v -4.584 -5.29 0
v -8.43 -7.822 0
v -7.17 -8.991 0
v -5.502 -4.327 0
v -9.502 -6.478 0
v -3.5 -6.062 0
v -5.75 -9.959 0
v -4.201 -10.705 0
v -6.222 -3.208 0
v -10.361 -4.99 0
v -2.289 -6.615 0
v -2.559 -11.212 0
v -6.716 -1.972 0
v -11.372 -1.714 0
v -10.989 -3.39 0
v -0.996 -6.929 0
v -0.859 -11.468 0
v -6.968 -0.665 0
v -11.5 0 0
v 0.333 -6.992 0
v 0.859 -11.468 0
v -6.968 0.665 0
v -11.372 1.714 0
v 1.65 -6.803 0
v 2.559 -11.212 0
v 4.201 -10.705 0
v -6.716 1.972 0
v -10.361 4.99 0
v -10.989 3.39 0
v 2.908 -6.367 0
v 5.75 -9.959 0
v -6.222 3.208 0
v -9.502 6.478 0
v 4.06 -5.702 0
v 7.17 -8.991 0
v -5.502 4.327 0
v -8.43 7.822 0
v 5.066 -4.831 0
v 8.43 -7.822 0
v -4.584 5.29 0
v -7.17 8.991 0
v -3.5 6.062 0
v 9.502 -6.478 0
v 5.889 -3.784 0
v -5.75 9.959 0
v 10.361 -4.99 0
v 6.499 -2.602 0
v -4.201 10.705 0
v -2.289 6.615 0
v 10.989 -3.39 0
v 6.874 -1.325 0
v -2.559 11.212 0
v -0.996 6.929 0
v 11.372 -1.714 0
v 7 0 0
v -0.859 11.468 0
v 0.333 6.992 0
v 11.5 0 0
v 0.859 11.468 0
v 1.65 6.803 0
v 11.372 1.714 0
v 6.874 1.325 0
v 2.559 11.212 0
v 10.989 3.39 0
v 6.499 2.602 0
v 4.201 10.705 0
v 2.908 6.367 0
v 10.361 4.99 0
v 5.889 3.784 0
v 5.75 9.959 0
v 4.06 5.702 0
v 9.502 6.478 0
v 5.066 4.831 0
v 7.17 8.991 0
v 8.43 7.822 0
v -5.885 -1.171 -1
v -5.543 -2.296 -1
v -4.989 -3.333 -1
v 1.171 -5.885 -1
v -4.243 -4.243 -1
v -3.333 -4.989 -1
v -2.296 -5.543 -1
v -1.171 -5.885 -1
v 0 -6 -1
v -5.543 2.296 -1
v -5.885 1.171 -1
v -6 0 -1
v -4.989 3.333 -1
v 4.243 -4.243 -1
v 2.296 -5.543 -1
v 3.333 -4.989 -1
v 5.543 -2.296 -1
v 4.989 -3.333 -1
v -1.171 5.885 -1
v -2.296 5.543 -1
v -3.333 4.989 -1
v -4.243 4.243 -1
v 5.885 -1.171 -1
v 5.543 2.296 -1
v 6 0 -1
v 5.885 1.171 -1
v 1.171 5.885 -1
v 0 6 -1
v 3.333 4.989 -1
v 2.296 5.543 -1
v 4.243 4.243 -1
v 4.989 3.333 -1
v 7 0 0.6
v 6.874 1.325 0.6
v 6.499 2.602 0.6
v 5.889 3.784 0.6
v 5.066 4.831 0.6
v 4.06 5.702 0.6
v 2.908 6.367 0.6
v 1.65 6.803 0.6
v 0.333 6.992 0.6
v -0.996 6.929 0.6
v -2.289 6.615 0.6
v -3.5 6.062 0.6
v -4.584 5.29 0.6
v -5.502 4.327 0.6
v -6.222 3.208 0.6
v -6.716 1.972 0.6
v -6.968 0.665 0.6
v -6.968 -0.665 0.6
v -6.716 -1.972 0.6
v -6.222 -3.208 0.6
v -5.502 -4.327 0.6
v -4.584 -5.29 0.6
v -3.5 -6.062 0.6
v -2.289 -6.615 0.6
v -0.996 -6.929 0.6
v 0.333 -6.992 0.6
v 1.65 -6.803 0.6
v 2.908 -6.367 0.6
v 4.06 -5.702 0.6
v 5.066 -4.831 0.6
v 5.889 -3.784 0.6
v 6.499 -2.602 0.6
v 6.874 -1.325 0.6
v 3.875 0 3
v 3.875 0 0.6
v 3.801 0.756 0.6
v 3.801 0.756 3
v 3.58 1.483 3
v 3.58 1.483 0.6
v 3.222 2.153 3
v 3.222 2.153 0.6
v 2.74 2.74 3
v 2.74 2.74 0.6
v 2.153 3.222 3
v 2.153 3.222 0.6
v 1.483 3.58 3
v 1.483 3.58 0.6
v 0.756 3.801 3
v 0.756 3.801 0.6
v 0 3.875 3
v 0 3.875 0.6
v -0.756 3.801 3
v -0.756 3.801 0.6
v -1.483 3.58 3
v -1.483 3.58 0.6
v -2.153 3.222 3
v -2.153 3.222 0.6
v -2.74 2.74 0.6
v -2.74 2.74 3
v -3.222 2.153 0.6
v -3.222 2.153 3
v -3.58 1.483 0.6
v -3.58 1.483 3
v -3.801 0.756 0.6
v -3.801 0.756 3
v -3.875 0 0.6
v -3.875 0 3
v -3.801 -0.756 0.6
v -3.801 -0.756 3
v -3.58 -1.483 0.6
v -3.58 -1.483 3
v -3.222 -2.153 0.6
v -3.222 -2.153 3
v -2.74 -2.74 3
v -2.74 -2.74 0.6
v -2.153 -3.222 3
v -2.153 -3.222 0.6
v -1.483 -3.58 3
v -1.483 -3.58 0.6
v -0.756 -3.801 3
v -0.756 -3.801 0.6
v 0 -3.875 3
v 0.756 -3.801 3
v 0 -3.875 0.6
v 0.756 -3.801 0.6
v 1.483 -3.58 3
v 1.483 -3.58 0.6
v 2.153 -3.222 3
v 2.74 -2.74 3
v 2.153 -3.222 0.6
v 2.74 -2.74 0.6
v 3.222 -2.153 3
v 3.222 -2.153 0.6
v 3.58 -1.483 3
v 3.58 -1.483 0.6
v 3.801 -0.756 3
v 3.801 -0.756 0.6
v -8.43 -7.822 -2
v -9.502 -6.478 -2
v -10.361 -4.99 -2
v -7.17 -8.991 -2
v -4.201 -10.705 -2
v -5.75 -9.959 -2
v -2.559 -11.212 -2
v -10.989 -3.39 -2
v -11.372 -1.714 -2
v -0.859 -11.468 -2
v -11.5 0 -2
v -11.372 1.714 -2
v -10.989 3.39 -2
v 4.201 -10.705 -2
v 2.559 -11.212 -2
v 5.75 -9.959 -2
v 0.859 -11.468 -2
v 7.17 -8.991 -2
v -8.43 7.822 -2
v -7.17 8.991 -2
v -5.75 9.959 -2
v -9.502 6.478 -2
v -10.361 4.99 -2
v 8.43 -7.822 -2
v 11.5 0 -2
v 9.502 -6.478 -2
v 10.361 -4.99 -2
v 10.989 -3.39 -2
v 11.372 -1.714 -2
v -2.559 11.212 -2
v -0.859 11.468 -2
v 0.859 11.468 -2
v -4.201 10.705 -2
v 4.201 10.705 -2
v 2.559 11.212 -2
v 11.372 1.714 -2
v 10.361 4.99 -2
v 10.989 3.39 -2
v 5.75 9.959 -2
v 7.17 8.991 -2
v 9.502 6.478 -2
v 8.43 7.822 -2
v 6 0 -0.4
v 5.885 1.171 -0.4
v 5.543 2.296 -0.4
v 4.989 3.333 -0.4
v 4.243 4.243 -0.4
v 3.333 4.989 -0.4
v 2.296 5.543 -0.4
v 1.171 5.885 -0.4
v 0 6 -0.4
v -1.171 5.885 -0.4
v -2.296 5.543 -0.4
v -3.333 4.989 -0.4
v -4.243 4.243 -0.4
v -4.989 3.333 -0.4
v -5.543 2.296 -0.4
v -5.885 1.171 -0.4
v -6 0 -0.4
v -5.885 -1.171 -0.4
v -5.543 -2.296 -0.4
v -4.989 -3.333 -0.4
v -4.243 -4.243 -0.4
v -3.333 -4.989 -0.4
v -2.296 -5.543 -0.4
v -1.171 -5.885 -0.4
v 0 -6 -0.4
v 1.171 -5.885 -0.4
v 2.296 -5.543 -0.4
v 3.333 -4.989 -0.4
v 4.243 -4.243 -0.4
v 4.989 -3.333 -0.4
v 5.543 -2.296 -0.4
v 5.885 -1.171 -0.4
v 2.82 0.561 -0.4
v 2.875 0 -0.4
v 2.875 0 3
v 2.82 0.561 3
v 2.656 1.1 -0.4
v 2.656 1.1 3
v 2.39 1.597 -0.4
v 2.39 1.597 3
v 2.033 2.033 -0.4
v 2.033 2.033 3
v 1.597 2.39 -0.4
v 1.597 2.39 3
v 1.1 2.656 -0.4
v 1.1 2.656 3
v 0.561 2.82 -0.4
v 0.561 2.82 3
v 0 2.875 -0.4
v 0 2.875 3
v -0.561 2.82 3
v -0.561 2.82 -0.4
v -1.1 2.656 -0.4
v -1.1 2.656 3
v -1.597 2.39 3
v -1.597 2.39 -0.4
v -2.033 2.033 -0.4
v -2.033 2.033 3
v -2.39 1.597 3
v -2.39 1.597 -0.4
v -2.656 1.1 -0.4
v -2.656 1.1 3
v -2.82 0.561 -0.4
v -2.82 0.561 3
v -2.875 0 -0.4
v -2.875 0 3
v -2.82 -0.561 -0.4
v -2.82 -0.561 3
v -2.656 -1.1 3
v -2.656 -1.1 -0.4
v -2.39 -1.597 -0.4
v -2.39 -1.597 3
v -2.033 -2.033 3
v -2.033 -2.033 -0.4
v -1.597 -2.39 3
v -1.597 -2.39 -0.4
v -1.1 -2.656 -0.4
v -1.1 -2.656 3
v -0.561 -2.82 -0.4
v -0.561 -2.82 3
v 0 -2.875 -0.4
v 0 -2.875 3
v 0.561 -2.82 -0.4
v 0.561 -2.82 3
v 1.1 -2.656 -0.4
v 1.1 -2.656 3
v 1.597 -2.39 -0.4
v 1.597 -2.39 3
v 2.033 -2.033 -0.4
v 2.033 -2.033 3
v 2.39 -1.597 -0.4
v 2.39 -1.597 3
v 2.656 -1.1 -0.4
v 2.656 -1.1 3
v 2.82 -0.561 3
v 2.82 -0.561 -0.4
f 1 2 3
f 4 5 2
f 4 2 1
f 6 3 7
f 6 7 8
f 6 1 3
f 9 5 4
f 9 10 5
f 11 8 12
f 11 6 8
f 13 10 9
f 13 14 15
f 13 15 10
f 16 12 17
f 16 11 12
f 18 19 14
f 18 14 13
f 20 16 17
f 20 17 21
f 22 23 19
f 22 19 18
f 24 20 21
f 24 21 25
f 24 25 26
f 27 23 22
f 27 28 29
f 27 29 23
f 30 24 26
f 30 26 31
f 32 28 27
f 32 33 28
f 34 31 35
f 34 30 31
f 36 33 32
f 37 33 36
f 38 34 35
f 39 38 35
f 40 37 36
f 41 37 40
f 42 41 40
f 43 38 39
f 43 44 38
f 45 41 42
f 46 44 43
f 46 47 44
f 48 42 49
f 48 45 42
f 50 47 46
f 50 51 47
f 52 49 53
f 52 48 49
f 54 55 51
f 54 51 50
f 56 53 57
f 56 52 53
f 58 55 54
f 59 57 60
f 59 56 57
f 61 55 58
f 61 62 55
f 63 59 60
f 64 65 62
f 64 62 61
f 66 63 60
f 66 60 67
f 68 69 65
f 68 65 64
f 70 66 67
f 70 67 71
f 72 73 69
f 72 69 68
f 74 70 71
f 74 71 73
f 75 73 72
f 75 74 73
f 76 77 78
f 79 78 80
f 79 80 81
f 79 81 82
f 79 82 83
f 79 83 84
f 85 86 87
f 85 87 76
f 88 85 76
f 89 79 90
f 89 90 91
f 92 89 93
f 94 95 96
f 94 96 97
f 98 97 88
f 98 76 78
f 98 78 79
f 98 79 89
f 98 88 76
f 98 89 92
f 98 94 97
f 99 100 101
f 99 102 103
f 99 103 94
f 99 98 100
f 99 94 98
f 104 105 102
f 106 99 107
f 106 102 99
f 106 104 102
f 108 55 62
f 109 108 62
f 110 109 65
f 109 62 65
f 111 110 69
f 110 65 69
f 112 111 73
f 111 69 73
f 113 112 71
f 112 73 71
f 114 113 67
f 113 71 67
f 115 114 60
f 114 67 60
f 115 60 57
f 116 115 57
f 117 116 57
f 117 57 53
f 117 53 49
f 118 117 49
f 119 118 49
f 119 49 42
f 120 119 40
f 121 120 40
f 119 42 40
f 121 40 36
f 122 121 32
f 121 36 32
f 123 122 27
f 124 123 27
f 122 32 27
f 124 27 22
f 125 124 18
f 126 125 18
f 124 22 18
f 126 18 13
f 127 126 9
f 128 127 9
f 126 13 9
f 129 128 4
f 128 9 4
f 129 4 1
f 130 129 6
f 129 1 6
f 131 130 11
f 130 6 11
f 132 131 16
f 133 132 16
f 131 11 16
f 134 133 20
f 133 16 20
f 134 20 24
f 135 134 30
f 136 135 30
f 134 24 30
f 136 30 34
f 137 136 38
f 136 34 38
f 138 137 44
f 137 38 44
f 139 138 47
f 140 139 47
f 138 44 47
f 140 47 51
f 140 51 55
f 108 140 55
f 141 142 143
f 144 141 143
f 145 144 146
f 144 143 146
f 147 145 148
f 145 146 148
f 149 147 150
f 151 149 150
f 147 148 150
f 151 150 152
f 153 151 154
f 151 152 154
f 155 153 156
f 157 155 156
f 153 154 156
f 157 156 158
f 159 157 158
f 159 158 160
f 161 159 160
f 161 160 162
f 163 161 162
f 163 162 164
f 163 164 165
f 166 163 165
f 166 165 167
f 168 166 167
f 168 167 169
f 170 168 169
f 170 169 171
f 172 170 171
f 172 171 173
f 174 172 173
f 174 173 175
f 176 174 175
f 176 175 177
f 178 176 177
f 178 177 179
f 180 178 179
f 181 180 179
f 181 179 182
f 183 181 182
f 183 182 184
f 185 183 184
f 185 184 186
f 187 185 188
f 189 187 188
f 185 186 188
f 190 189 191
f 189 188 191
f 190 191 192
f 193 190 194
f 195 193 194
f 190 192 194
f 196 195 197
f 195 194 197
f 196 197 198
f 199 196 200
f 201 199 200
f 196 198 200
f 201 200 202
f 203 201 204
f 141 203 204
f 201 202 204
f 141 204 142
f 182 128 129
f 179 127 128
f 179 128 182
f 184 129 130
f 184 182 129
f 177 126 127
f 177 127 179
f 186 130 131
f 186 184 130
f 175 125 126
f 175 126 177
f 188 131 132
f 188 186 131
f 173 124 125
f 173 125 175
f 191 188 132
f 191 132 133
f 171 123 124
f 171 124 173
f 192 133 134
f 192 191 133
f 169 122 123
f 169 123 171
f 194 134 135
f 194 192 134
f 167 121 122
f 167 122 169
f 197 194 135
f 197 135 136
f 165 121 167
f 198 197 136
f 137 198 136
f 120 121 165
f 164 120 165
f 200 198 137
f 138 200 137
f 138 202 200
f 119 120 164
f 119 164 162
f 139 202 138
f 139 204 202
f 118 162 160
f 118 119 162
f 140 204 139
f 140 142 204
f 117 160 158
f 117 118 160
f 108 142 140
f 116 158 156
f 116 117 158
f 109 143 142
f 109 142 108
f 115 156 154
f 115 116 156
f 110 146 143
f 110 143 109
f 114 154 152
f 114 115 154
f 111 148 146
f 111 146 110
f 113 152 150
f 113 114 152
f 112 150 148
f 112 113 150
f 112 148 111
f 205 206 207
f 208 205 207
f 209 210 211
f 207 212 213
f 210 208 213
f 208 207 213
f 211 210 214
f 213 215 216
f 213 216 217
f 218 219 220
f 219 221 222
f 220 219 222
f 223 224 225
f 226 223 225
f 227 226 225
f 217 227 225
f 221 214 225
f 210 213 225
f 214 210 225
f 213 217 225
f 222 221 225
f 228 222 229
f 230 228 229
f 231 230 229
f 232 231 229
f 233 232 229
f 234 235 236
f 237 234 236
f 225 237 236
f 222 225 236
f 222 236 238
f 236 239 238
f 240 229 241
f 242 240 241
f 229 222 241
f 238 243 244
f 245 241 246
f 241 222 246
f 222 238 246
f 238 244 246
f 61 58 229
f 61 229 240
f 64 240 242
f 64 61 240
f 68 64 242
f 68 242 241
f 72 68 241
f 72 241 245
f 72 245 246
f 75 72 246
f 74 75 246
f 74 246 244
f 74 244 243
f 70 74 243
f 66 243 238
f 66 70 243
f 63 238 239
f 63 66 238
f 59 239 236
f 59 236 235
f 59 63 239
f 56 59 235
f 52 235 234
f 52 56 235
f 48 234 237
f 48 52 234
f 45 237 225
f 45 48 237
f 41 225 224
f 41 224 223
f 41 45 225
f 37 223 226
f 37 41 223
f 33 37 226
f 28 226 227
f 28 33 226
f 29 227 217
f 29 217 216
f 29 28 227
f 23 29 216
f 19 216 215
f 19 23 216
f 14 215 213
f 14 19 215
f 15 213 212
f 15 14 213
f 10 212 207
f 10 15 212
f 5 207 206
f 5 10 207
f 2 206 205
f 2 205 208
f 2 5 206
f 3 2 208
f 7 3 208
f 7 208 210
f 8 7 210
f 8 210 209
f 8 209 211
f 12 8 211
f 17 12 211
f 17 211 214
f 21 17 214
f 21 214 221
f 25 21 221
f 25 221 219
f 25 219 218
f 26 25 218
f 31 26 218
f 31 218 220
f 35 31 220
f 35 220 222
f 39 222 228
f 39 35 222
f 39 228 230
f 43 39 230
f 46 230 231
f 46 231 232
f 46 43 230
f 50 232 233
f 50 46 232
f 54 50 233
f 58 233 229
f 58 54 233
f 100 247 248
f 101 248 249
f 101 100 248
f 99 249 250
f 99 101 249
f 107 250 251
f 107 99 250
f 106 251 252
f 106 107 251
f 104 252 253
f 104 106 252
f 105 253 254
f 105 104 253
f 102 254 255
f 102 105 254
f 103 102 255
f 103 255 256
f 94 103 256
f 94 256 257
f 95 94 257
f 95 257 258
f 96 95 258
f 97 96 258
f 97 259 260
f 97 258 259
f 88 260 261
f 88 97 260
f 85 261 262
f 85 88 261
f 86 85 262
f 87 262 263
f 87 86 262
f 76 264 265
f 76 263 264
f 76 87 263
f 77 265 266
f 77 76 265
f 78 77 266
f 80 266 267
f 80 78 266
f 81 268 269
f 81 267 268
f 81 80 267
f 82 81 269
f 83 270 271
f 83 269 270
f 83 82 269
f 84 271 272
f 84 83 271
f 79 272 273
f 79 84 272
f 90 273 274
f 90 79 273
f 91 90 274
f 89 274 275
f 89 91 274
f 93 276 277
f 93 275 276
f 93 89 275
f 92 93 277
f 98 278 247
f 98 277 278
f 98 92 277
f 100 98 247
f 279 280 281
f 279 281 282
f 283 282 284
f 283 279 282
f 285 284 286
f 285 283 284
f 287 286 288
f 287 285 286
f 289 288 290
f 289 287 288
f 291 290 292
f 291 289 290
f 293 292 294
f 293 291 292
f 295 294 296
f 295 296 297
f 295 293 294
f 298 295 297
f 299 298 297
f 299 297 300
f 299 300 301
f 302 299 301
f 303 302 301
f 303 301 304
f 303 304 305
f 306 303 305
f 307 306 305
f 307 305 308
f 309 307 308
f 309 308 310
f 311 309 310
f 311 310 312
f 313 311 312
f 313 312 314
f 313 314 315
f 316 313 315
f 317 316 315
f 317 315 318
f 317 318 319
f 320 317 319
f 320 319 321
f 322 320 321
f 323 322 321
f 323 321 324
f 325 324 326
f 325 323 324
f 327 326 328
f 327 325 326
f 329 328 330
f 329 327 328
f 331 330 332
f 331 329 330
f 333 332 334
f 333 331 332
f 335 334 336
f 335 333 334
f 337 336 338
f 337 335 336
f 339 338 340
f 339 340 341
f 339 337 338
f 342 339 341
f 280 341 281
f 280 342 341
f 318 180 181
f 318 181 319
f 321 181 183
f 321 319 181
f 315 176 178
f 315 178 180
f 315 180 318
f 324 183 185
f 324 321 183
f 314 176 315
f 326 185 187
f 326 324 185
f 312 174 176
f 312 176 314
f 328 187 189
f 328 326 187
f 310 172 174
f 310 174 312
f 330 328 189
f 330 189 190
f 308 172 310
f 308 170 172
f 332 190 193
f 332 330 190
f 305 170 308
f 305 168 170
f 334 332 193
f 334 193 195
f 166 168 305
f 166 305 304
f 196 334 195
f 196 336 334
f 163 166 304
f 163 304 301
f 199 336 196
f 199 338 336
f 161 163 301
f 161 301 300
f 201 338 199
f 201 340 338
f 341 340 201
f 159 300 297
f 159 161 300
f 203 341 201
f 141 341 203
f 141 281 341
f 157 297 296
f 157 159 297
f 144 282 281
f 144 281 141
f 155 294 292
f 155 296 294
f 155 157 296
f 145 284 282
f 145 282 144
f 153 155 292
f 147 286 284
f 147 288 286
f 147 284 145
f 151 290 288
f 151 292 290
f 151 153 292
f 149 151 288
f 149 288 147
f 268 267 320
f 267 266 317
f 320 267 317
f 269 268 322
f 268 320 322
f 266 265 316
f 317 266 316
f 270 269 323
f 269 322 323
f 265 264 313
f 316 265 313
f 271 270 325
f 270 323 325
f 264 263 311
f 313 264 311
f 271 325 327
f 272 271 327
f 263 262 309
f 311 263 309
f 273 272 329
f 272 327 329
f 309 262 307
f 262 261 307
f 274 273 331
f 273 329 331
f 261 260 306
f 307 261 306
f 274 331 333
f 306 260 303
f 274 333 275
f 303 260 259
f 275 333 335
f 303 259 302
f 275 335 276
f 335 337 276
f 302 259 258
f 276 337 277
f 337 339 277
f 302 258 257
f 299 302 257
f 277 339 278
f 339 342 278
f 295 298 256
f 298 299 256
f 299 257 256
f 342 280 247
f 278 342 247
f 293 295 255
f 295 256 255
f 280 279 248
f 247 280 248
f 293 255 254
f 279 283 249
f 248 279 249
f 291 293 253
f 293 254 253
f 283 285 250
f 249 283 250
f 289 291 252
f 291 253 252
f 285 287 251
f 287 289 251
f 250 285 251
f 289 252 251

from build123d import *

# Parameters (mm, degrees)
F0_R     = 3.875
F1_DEPTH = 3
F0_R_2   = 7
F2_DEPTH = 0.6
F0_R_3   = 11.5
F3_DEPTH = 2
F4_DEPTH = 2
F6_T     = 1


# Not quite as in the source:
# - a shell that OpenCascade refuses in one call is made with other operations: the cavity is built on its own and cut out
# - the program builds the solid bodies; features that only make, move or delete a surface that nothing else refers to are left out


with BuildPart() as f1:
    # F0 (on Top) → F1 (new body)
    with BuildSketch(Plane.XY):
        Circle(F0_R)
    extrude(amount=F1_DEPTH)

    # F0 (on Top) → F2 (join)
    with BuildSketch(Plane.XY):
        Circle(F0_R_2)
        Circle(F0_R, mode=Mode.SUBTRACT)
    extrude(amount=F2_DEPTH)

    # F0 (on Top) → F3 (join)
    with BuildSketch(Plane.XY):
        Circle(F0_R_3)
        Circle(F0_R_2, mode=Mode.SUBTRACT)
        Circle(F0_R_2)
        Circle(F0_R, mode=Mode.SUBTRACT)
    extrude(amount=-F3_DEPTH)

    # F0 (on Top) → F4 (join)
    with BuildSketch(Plane.XY):
        Circle(F0_R)
    extrude(amount=-F4_DEPTH)

    # F6: shell of thickness 1, made by hand


with BuildPart() as f6_core1:
    # F6_t2: copy of F1
    add(f1.part)

    # the walls: a layer under each face that stays
    f6_faces = [f6_core1.faces().sort_by_distance(p)[0] for p in [
        (-3.875, 0, 1.8),
        (-4.6666666667, -4.6666666667, 0.6),
        (-7, 0, 0.3),
        (-7.6666666667, -7.6666666667, 0),
        (-11.5, 0, -1),
        (0, 0, -2),
    ]]
    thicken(f6_faces, amount=-F6_T, mode=Mode.SUBTRACT)

    # F6_s3 → F6_t4 (revolve, cut)
    with BuildSketch(Plane.XZ):
        Polygon((3.885, 0.61), (2.875, 0.6), (2.875, -0.4), (3.875, -0.4), align=None)
    revolve(axis=Axis((0, 0, 0.6), (0, 0, 1)), mode=Mode.SUBTRACT)

    # F6_s5 → F6_t6 (revolve, cut)
    with BuildSketch(Plane.XZ):
        Polygon((7.01, 0.01), (6, 0), (6, -1), (7, -1), align=None)
    revolve(axis=Axis((0, 0, 0), (0, 0, 1)), mode=Mode.SUBTRACT)


with BuildPart() as f1_1:
    add(f1.part)

    # what is left inside the walls is the cavity
    f6_cavity = [f6_core1.part.solids().sort_by_distance(p)[0] for p in [
        (0, -2, -0.99),
    ]]
    add(f6_cavity, mode=Mode.SUBTRACT)


solid = f1_1.part
